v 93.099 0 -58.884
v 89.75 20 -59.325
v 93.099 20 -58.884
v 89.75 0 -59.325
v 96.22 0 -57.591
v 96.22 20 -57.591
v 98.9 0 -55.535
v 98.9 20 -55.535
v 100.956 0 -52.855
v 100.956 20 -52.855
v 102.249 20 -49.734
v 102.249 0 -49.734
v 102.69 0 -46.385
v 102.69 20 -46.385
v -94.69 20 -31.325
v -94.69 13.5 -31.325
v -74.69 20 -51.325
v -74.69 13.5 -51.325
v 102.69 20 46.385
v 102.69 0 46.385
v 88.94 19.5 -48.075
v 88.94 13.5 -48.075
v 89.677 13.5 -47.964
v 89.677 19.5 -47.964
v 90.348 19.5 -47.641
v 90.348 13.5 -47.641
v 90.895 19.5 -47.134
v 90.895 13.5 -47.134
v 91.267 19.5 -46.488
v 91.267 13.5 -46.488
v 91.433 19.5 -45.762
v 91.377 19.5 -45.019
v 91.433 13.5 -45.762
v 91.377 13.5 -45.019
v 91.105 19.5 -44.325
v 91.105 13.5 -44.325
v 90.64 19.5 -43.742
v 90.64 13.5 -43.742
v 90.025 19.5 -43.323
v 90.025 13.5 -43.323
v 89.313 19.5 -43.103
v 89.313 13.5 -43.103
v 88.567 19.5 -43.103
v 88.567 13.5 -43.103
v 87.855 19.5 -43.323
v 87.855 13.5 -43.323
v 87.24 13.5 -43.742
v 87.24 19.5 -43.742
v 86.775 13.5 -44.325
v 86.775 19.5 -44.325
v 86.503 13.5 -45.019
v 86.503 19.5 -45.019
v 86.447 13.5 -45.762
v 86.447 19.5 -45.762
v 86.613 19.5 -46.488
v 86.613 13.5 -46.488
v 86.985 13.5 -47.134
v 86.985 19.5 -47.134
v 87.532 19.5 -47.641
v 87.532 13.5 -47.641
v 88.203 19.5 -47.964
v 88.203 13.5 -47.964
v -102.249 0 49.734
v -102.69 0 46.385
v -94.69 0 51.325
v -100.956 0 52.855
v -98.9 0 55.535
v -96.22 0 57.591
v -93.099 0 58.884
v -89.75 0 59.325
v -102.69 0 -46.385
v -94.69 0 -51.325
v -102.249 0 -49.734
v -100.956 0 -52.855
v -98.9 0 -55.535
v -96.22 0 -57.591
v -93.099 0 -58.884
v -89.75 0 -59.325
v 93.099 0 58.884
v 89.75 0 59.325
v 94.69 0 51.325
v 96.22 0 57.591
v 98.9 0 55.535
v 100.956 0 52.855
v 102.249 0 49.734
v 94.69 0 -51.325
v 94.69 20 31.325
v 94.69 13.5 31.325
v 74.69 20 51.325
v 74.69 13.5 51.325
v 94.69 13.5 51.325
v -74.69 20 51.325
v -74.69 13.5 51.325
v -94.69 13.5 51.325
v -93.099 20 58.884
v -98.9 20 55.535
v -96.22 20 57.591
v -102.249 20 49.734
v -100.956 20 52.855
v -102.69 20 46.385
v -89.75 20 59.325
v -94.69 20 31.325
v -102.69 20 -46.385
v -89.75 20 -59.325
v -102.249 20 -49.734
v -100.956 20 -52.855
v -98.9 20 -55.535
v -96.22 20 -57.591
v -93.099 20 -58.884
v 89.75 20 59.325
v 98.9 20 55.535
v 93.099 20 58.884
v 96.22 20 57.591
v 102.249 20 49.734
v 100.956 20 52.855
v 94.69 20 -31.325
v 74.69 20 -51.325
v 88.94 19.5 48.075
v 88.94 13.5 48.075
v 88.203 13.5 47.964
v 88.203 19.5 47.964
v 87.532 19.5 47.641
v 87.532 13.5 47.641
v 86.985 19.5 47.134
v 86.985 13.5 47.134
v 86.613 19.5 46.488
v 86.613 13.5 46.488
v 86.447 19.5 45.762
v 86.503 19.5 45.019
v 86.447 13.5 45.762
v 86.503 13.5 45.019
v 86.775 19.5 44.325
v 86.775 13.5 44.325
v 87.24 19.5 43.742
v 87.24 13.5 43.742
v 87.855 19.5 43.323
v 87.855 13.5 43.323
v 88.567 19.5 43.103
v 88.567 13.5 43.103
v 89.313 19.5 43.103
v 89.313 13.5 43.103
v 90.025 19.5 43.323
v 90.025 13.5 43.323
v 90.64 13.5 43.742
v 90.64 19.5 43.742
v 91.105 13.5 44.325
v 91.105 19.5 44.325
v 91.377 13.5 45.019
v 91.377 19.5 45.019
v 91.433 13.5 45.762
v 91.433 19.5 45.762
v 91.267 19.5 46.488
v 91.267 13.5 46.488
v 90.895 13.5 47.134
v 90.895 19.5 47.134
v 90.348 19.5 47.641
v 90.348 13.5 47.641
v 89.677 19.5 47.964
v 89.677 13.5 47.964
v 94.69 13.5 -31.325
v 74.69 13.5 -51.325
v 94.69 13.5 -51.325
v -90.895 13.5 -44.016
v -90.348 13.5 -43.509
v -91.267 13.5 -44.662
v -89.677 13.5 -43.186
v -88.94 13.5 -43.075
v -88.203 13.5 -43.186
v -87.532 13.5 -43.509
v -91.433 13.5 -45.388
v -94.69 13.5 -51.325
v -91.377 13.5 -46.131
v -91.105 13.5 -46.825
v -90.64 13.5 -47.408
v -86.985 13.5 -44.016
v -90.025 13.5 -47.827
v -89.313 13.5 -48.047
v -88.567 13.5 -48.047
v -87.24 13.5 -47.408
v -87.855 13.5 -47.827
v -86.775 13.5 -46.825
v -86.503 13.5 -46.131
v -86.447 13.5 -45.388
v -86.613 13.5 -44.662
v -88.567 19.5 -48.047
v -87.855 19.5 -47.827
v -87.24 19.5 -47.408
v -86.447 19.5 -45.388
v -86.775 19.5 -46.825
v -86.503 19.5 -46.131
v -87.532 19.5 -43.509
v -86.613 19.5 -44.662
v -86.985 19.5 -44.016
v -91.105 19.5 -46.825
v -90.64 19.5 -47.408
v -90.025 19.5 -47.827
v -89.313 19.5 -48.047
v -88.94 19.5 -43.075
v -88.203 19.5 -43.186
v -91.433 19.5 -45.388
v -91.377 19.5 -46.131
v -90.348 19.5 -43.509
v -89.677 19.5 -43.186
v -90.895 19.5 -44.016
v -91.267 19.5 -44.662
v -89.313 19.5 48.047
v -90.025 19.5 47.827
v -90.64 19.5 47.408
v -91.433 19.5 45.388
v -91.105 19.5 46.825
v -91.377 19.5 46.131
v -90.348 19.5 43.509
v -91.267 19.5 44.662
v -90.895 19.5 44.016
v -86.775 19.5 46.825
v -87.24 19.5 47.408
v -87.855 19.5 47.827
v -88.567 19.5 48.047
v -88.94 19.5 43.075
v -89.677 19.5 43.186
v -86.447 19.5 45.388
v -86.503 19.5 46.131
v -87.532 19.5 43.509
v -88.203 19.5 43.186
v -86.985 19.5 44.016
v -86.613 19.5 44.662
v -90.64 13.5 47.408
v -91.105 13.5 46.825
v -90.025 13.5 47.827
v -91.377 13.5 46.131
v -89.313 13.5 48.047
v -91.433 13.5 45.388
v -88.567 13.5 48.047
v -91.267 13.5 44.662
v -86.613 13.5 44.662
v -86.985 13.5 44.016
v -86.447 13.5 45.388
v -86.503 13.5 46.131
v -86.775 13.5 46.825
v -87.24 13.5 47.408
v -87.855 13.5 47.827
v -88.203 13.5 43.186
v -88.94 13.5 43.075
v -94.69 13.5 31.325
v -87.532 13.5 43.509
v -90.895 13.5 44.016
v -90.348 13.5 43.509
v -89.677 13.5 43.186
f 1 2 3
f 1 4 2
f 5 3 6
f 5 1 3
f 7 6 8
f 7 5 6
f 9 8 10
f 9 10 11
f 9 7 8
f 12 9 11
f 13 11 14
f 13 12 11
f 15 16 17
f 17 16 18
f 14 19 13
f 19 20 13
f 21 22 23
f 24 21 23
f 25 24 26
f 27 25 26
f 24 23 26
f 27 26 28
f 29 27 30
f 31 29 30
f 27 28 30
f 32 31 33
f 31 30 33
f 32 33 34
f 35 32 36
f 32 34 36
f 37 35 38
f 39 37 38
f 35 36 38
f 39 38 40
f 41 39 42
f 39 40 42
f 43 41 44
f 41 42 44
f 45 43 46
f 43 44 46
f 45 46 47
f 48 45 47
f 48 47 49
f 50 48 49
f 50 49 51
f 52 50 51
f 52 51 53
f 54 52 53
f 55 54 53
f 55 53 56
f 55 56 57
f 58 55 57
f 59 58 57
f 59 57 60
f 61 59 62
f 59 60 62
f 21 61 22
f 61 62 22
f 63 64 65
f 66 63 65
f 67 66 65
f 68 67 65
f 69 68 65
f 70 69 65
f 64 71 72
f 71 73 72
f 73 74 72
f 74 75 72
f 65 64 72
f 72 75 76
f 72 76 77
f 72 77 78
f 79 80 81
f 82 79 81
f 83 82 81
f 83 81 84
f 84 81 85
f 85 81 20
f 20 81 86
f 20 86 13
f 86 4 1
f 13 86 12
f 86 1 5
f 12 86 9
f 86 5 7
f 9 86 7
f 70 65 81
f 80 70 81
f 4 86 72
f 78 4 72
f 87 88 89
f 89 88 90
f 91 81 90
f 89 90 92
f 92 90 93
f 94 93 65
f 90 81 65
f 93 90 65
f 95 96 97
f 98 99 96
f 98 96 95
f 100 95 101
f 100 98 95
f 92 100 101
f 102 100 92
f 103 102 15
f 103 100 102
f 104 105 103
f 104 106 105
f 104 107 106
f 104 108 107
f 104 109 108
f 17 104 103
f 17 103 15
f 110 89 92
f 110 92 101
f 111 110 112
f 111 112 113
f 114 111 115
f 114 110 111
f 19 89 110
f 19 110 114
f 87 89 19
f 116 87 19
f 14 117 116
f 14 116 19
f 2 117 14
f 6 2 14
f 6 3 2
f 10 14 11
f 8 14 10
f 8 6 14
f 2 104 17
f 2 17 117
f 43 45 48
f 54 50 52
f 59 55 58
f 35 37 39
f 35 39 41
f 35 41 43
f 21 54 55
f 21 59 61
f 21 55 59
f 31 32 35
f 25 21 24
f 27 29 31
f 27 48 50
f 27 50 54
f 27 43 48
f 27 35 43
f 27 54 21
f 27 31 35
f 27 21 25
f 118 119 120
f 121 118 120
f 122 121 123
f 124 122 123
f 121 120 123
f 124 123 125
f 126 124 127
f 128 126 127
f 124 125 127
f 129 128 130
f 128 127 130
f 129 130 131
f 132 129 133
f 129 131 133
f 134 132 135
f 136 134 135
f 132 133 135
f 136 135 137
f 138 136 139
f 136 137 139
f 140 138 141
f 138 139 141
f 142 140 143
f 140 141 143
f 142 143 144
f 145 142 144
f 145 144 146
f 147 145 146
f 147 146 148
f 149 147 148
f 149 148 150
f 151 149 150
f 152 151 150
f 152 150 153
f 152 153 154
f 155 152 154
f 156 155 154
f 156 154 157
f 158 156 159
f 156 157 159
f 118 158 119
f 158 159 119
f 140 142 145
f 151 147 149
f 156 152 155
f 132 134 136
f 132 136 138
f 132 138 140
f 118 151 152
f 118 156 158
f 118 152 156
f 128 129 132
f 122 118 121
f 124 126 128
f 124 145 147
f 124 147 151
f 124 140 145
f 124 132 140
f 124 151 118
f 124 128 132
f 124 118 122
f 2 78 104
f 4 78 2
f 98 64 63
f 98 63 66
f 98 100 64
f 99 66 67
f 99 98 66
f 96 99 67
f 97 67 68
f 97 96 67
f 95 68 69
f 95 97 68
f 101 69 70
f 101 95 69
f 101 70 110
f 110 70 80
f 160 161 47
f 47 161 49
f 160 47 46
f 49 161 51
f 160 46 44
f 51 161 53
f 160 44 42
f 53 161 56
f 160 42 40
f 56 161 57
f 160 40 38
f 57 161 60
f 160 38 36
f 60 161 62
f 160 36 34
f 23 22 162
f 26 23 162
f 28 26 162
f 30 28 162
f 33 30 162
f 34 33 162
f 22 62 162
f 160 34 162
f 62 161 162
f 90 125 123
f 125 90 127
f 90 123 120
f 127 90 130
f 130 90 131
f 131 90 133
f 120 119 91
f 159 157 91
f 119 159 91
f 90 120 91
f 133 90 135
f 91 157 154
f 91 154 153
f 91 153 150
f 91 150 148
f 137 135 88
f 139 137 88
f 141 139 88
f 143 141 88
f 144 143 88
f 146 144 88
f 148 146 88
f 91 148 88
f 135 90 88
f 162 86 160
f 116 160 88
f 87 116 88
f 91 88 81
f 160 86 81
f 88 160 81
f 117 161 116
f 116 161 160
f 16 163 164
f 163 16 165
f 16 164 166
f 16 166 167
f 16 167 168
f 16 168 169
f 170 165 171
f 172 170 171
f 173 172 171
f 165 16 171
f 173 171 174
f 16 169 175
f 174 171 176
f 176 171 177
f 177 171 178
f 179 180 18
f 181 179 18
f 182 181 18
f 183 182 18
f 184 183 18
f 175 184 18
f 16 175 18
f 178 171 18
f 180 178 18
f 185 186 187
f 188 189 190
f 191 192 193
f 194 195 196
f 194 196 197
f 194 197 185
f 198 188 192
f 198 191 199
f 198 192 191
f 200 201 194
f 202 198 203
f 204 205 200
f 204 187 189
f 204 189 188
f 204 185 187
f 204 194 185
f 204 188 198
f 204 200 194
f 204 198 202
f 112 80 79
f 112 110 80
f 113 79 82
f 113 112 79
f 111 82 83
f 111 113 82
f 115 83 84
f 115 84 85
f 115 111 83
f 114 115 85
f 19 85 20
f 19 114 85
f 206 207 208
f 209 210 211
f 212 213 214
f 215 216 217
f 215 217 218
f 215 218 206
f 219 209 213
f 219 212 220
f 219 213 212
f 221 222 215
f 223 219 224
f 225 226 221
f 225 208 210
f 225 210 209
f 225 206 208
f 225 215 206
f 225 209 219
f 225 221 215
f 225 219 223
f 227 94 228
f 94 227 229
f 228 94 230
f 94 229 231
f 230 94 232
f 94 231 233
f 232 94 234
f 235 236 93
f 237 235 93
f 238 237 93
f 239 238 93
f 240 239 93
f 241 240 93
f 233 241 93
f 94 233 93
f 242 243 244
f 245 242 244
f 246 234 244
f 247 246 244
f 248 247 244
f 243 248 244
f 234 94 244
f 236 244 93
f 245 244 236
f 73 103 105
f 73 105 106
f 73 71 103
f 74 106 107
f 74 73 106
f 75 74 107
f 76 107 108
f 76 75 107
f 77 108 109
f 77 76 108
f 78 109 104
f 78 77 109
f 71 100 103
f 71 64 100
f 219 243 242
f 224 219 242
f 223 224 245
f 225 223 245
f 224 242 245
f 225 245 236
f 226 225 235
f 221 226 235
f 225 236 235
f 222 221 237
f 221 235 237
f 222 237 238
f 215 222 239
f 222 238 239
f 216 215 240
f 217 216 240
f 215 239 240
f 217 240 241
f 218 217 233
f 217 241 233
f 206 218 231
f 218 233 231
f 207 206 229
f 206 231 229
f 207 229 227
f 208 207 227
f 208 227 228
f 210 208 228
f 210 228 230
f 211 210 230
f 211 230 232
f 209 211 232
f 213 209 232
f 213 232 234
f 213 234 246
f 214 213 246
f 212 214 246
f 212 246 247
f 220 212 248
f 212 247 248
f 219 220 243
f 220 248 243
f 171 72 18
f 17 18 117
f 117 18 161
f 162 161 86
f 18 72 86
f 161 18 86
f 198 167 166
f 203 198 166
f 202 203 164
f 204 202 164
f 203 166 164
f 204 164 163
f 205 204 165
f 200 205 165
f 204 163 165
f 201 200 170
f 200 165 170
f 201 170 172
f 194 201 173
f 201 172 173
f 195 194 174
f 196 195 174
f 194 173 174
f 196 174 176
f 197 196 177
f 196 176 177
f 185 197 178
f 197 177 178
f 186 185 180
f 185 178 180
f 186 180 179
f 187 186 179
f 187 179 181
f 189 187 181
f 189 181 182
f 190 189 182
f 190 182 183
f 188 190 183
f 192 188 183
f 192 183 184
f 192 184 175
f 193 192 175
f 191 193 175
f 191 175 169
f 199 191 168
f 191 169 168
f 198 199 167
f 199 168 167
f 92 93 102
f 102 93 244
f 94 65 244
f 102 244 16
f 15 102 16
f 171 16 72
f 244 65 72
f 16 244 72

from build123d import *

# Parameters (mm, degrees)
SKETCH1_W           = 205.38
SKETCH1_H           = 118.65
SKETCH1_W_2         = 189.38
SKETCH1_H_2         = 102.65
BOSS_EXTRUDE1_DEPTH = 13.5
SKETCH3_W           = 205.38
SKETCH3_H           = 118.65
BOSS_EXTRUDE2_DEPTH = 6.5
SKETCH4_R           = 2.5
CUT_EXTRUDE1_DEPTH  = 6
FILLET1_R           = 12.94


with BuildPart() as part:
    # Sketch1 → Boss-Extrude1 (new body)
    with BuildSketch(Plane(origin=(0, 0, 0), x_dir=(1, 0, 0), z_dir=(0, 1, 0))):
        Rectangle(SKETCH1_W, SKETCH1_H)
        Rectangle(SKETCH1_W_2, SKETCH1_H_2, mode=Mode.SUBTRACT)
    extrude(amount=BOSS_EXTRUDE1_DEPTH)

    # Sketch3 → Boss-Extrude2 (add)
    with BuildSketch(Plane(origin=(0, 13.5, 0), x_dir=(1, 0, 0), z_dir=(0, 1, 0))):
        Rectangle(SKETCH3_W, SKETCH3_H)
        Polygon((-94.69, 31.325), (-74.69, 51.325), (74.69, 51.325), (94.69, 31.325), (94.69, -31.325), (74.69, -51.325), (-74.69, -51.325), (-94.69, -31.325), align=None, mode=Mode.SUBTRACT)
    extrude(amount=BOSS_EXTRUDE2_DEPTH)

    # Sketch4 → Cut-Extrude1 (cut)
    with BuildSketch(Plane.XZ.offset(-13.5)):
        with Locations(Location((-88.94, 45.575, 0), (0, 0, 270))):
            Circle(SKETCH4_R)
        with Locations(Location((88.94, 45.575, 0), (0, 0, 90))):
            Circle(SKETCH4_R)
        with Locations(Location((88.94, -45.575, 0), (0, 0, 270))):
            Circle(SKETCH4_R)
        with Locations(Location((-88.94, -45.575, 0), (0, 0, 90))):
            Circle(SKETCH4_R)
    extrude(amount=-CUT_EXTRUDE1_DEPTH, mode=Mode.SUBTRACT)

    # Fillet1
    fillet1_edges = [part.edges().sort_by_distance(p)[0] for p in [
        (102.69, 10, 59.325),
        (-102.69, 10, 59.325),
        (-102.69, 10, -59.325),
        (102.69, 10, -59.325),
    ]]
    fillet(fillet1_edges, radius=FILLET1_R)


solid = part.part
